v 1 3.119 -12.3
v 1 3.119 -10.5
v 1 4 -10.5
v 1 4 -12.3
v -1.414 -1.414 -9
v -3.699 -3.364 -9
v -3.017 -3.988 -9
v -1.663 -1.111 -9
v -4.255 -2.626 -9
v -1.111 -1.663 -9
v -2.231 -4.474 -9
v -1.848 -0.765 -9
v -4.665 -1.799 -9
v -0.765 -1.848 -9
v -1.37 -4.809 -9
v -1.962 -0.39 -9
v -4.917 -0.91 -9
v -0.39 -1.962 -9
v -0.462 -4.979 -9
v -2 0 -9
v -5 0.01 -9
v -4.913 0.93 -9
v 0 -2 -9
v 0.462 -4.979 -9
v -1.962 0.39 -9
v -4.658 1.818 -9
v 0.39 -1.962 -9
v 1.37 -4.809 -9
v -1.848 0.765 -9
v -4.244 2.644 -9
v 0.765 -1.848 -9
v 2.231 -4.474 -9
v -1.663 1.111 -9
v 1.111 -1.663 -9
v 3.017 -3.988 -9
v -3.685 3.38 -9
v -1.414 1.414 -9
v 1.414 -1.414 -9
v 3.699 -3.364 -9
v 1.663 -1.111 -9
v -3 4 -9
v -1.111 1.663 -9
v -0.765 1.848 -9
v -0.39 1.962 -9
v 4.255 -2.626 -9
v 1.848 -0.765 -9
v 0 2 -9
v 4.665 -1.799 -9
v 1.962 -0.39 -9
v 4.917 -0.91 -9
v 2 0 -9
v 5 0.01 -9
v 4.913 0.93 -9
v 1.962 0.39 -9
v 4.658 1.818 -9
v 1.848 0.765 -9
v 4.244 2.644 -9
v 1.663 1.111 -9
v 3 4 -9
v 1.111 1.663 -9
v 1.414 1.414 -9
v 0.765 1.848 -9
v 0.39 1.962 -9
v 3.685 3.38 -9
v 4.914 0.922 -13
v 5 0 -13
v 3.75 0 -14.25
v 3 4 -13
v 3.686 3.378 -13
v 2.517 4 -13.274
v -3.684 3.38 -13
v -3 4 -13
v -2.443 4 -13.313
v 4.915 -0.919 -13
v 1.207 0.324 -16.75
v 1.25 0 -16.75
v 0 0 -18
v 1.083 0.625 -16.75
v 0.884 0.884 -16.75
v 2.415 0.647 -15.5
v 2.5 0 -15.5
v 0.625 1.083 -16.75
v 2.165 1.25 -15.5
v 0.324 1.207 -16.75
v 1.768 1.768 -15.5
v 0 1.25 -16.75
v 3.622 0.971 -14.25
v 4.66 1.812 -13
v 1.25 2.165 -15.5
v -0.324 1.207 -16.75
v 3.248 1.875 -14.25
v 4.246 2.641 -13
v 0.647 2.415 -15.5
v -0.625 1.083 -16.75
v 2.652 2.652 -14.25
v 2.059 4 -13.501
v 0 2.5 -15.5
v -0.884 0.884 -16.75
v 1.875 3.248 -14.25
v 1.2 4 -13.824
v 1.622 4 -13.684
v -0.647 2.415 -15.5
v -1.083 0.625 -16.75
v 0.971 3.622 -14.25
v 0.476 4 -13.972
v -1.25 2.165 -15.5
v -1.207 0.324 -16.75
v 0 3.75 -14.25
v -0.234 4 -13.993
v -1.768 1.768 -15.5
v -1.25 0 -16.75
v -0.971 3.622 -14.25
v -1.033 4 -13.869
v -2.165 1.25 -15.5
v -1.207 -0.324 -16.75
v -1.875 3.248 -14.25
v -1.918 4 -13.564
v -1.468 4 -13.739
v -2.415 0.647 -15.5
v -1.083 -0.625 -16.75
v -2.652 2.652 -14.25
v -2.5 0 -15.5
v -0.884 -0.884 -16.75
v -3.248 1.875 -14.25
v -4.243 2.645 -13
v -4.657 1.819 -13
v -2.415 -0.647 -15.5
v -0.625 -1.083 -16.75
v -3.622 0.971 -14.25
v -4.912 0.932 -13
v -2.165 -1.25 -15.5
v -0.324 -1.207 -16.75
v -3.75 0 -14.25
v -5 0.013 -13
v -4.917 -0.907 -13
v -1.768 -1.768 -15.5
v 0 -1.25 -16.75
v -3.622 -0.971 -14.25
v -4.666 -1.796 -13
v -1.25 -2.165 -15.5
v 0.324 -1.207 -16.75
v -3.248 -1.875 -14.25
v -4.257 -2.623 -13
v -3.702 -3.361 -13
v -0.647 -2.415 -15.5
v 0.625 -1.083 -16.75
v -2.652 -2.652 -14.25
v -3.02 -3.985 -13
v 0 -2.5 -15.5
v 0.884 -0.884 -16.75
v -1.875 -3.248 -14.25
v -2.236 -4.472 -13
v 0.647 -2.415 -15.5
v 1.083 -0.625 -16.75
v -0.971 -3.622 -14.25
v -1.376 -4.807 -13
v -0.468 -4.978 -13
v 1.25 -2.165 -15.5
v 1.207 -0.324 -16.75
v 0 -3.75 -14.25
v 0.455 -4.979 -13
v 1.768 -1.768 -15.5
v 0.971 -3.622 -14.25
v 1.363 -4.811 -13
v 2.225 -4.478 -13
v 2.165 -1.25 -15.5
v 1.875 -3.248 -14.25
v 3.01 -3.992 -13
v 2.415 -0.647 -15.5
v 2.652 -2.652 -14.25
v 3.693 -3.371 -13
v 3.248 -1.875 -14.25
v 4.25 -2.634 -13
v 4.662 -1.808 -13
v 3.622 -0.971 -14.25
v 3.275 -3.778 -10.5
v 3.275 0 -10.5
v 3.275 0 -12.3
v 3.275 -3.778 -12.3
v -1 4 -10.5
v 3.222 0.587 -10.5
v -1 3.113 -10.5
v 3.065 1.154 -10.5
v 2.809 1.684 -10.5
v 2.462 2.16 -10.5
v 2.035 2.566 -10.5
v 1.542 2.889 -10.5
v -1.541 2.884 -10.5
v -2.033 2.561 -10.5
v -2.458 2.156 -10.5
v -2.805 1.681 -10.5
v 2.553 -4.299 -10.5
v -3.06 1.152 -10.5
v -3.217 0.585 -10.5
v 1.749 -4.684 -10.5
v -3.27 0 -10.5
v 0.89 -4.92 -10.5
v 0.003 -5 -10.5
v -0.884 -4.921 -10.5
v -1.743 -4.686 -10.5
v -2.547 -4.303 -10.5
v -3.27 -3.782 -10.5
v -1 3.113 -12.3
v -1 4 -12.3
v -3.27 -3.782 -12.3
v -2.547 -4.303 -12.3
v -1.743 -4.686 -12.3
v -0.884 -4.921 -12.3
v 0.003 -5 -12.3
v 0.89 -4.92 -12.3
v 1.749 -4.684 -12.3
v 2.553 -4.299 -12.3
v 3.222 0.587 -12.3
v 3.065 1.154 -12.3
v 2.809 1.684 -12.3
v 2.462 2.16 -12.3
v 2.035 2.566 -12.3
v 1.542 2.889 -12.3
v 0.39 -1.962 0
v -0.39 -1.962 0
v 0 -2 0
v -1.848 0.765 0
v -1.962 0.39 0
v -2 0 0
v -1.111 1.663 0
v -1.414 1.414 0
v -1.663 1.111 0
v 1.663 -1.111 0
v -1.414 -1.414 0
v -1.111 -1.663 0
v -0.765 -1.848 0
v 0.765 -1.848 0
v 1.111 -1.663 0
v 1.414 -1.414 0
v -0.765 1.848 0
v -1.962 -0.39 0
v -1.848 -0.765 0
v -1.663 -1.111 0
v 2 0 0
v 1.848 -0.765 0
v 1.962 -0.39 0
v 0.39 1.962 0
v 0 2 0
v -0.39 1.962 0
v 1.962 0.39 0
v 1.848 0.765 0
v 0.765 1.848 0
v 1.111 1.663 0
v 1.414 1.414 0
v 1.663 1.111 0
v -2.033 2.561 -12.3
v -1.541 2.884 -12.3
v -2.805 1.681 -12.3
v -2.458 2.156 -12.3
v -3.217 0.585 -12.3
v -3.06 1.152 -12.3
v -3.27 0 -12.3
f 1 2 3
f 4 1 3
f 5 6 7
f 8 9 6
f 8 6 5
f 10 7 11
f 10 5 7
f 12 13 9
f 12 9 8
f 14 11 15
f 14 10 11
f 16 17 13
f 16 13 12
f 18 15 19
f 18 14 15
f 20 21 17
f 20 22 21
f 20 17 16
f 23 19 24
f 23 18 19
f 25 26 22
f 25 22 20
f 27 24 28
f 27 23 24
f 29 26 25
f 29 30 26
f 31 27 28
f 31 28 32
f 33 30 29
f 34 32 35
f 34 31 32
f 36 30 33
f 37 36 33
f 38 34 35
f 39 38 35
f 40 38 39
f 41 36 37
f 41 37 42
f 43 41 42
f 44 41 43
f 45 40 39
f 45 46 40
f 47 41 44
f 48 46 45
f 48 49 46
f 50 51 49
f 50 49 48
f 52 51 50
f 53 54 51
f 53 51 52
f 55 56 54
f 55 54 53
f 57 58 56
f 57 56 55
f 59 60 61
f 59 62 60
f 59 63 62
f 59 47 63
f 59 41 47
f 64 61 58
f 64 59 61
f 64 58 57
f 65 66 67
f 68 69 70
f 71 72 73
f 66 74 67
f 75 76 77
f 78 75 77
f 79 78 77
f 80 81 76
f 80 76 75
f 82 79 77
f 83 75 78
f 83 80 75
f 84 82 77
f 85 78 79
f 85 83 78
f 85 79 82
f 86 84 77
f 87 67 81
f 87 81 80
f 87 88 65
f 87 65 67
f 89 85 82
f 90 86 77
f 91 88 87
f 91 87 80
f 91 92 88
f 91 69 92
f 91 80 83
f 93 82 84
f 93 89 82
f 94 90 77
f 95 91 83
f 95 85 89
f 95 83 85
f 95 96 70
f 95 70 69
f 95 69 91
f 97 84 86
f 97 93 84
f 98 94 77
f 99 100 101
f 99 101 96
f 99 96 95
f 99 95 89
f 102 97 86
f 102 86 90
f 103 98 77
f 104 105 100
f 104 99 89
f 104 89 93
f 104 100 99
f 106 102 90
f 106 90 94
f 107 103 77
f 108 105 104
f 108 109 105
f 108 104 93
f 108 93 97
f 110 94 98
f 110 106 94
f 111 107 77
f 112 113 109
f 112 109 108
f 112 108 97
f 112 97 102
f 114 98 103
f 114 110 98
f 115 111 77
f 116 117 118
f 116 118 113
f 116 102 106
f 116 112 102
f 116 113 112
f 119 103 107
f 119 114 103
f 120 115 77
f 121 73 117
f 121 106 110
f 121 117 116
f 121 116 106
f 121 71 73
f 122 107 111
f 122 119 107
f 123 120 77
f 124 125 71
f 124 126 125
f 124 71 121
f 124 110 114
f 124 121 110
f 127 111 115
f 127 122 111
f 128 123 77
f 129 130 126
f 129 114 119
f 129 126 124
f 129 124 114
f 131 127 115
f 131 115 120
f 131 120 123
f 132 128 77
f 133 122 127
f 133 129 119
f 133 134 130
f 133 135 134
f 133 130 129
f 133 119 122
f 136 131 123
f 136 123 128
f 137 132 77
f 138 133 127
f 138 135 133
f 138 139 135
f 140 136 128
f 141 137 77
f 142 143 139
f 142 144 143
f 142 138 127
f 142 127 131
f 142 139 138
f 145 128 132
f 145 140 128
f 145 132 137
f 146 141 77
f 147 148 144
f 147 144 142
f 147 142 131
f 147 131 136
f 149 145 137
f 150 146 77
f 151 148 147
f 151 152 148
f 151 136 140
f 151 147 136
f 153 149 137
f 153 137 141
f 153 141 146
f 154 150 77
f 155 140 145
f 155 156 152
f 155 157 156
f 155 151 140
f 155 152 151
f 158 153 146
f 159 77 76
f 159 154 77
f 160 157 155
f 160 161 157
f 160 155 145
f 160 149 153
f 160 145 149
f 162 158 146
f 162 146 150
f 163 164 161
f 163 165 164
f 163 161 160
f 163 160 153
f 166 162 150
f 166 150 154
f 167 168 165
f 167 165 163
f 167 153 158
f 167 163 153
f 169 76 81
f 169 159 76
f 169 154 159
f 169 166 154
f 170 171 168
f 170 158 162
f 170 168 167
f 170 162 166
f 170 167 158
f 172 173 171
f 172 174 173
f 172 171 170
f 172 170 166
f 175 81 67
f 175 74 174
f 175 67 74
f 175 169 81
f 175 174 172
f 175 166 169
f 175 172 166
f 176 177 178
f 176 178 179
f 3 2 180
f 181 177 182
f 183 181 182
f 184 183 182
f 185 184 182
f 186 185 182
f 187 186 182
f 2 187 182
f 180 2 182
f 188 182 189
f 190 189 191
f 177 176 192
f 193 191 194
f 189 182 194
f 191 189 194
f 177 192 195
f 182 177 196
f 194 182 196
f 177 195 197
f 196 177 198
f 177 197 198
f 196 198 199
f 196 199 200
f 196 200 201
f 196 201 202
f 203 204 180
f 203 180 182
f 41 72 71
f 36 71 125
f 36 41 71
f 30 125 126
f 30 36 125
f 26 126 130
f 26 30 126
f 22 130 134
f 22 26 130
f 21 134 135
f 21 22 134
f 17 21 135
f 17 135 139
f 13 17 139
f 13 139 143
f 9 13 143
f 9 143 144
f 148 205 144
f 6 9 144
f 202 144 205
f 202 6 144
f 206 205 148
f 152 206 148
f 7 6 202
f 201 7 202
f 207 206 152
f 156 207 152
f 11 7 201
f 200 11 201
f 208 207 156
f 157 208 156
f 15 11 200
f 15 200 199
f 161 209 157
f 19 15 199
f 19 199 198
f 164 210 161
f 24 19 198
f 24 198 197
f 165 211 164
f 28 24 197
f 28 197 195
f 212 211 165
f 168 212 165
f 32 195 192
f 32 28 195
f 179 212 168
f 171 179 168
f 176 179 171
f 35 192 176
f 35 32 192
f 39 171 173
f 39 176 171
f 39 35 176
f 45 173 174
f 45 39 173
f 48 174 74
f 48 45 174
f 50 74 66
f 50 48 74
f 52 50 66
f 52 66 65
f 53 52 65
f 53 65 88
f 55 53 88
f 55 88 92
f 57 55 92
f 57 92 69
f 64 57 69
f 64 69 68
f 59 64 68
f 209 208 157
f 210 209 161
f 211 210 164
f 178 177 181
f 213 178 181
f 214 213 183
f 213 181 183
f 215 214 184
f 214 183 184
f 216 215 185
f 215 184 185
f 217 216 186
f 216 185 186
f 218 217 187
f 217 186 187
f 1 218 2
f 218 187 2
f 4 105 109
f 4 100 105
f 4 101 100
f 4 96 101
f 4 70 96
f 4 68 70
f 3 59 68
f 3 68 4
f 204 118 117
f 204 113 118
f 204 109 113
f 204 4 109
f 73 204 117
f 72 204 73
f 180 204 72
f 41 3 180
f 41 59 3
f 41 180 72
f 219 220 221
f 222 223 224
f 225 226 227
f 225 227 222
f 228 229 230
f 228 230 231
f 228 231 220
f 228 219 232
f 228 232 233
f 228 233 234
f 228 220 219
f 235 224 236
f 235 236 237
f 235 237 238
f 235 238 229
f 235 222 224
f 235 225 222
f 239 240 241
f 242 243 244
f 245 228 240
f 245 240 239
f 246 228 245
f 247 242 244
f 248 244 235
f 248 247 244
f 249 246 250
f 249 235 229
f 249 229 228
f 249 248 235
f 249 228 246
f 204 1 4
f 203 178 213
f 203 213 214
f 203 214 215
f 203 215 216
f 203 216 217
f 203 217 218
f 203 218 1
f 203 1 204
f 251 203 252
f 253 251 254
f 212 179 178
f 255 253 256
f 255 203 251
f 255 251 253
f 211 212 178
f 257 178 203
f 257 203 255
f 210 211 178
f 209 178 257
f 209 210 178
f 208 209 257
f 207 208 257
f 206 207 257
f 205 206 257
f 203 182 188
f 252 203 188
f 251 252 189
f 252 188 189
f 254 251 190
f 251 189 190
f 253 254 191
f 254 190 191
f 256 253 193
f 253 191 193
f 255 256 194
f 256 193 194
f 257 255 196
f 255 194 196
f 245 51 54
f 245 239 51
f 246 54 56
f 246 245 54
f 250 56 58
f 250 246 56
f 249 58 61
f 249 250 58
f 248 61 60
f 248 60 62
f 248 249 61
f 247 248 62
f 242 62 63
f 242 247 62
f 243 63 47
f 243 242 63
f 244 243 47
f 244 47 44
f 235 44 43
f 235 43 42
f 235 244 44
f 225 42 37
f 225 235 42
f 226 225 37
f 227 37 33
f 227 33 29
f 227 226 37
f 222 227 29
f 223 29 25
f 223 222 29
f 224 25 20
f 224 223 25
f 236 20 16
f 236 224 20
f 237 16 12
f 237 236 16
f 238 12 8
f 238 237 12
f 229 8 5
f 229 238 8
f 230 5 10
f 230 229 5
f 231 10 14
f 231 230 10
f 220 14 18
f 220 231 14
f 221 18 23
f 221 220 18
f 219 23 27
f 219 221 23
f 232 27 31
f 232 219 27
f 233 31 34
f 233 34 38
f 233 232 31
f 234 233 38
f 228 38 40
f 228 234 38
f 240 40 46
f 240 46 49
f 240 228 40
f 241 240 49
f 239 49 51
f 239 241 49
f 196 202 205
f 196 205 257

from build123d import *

# Parameters (mm, degrees)
SKETCH008_W     = 10
SKETCH008_H     = 1.5
POCKET004_DEPTH = 9.001
POCKET005_DEPTH = 1.8


with BuildPart() as part:
    # Sketch007 → Revolution001 (revolve)
    with BuildSketch(Plane.XZ):
        Polygon((0, 0), (0, -18), (5, -13), (5, -9), (2, -9), (2, 0), align=None)
    revolve(axis=Axis((0, 0, 0), (0, 0, 1)))

    # Sketch008 (on Face3 of Revolution001) → Pocket004 (cut, through all)
    with BuildSketch(Plane(origin=(0, 0, -9), x_dir=(-1, 0, 0), z_dir=(0, 0, 1))):
        with Locations((0, -4.75)):
            Rectangle(SKETCH008_W, SKETCH008_H)
    extrude(amount=-POCKET004_DEPTH, mode=Mode.SUBTRACT)

    # Sketch009 (on Face5 of Pocket004) → Pocket005 (cut)
    with BuildSketch(Plane(origin=(0, 0, -10.5), x_dir=(-1, 0, 0), z_dir=(0, 0, 1))):
        with BuildLine():
            ThreePointArc((-3.275, 0), (-2.64581, -1.930107), (-1, -3.118593))
            Line((-1, -3.118593), (-1, -6.5))
            Line((-1, -6.5), (1, -6.5))
            Line((1, -6.5), (1, -3.113342))
            ThreePointArc((1, -3.113342), (2.642243, -1.926512), (3.27, 0))
            Line((3.27, 6.5), (3.27, 0))
            Line((-3.275, 6.5), (3.27, 6.5))
            Line((-3.275, 0), (-3.275, 6.5))
        make_face()
    extrude(amount=-POCKET005_DEPTH, mode=Mode.SUBTRACT)


solid = part.part
